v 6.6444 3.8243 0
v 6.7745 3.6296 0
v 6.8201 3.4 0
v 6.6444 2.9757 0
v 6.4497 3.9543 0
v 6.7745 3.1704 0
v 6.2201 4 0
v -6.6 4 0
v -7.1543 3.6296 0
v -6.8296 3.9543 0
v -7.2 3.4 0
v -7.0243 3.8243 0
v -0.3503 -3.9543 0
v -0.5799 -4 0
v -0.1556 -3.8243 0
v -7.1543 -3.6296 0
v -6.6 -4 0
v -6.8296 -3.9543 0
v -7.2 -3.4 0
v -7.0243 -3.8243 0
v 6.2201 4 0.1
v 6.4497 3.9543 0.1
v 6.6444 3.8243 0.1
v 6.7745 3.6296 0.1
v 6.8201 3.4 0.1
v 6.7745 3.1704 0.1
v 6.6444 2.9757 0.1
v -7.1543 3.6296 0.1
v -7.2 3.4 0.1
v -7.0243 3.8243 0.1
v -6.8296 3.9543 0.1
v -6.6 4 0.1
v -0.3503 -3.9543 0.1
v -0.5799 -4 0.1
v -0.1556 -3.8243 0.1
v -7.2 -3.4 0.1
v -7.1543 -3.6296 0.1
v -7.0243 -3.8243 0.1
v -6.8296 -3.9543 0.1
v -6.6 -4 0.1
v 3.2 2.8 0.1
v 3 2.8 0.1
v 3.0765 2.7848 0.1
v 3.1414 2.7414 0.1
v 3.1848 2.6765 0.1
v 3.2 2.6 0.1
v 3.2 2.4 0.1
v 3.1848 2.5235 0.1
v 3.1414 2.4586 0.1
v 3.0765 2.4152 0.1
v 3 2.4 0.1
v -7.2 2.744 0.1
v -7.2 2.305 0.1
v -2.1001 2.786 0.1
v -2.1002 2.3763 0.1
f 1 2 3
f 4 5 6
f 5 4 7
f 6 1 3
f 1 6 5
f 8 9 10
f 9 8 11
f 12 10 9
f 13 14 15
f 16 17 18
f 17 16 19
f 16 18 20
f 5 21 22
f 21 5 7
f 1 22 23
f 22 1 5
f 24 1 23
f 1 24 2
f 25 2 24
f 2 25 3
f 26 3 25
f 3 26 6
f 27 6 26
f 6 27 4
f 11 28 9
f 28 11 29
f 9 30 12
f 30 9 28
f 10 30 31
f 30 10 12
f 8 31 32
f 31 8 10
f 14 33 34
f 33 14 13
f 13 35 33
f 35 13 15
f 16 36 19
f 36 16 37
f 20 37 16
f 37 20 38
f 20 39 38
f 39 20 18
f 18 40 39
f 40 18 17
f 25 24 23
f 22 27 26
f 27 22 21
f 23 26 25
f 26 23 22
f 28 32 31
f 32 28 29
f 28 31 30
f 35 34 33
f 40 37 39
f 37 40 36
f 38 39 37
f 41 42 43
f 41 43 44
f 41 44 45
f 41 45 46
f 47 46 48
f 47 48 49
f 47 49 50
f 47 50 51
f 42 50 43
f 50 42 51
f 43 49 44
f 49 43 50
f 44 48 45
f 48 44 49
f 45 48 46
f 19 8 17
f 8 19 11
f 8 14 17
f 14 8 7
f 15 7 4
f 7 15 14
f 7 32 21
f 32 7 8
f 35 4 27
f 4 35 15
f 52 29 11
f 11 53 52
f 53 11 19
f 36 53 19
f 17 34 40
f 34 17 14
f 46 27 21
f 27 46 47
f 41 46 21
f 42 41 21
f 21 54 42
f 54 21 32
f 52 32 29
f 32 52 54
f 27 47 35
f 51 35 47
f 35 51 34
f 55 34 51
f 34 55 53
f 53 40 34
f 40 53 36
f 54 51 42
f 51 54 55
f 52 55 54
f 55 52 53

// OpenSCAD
// file: ../p/3-8cyli.scad
use <../lib.scad>
function ldraw_lib__3_8cyli() = [
// 0 Cylinder 0.375
// 0 Name: 3-8cyli.dat
// 0 Author: James Jessiman
// 0 !LDRAW_ORG Primitive UPDATE 2005-01
// 0 !LICENSE Licensed under CC BY 4.0 : see CAreadme.txt
// 
// 0 BFC CERTIFY CCW
  [0,"BFC","CERTIFY"],
  [0,"BFC","CCW"],
// 
// 0 !HISTORY 2002-05-08 [OrionP] Made BFC compliant
// 0 !HISTORY 2002-08-18 [PTadmin] Official Update 2002-04
// 0 !HISTORY 2004-12-11 [nielsk] Recreated using Primitive Generator, Edge lines fixed, BFC changed to CCW
// 0 !HISTORY 2005-12-28 [PTadmin] Official Update 2005-01
// 0 !HISTORY 2007-06-24 [PTadmin] Header formatted for Contributor Agreement
// 0 !HISTORY 2008-07-01 [PTadmin] Official Update 2008-01
// 
// 
// 4 16 .9239 1 .3827 .9239 0 .3827 1 0 0 1 1 0
  [4,16,.9239,1,.3827,.9239,0,.3827,1,0,0,1,1,0],
// 4 16 .7071 1 .7071 .7071 0 .7071 .9239 0 .3827 .9239 1 .3827
  [4,16,.7071,1,.7071,.7071,0,.7071,.9239,0,.3827,.9239,1,.3827],
// 4 16 .3827 1 .9239 .3827 0 .9239 .7071 0 .7071 .7071 1 .7071
  [4,16,.3827,1,.9239,.3827,0,.9239,.7071,0,.7071,.7071,1,.7071],
// 4 16 0 1 1 0 0 1 .3827 0 .9239 .3827 1 .9239
  [4,16,0,1,1,0,0,1,.3827,0,.9239,.3827,1,.9239],
// 4 16 -.3827 1 .9239 -.3827 0 .9239 0 0 1 0 1 1
  [4,16,-.3827,1,.9239,-.3827,0,.9239,0,0,1,0,1,1],
// 4 16 -.7071 1 .7071 -.7071 0 .7071 -.3827 0 .9239 -.3827 1 .9239
  [4,16,-.7071,1,.7071,-.7071,0,.7071,-.3827,0,.9239,-.3827,1,.9239],
// 5 24 1 1 0 1 0 0 1 1 -.4142 .9239 1 .3827
  [5,24,1,1,0,1,0,0,1,1,-.4142,.9239,1,.3827],
// 5 24 .9239 1 .3827 .9239 0 .3827 1 1 0 .7071 1 .7071
  [5,24,.9239,1,.3827,.9239,0,.3827,1,1,0,.7071,1,.7071],
// 5 24 .7071 1 .7071 .7071 0 .7071 .9239 1 .3827 .3827 1 .9239
  [5,24,.7071,1,.7071,.7071,0,.7071,.9239,1,.3827,.3827,1,.9239],
// 5 24 .3827 1 .9239 .3827 0 .9239 .7071 1 .7071 0 1 1
  [5,24,.3827,1,.9239,.3827,0,.9239,.7071,1,.7071,0,1,1],
// 5 24 0 1 1 0 0 1 .3827 1 .9239 -.3827 1 .9239
  [5,24,0,1,1,0,0,1,.3827,1,.9239,-.3827,1,.9239],
// 5 24 -.3827 1 .9239 -.3827 0 .9239 0 1 1 -.7071 1 .7071
  [5,24,-.3827,1,.9239,-.3827,0,.9239,0,1,1,-.7071,1,.7071],
// 5 24 -.7071 1 .7071 -.7071 0 .7071 -.3827 1 .9239 -1 1 .4142
  [5,24,-.7071,1,.7071,-.7071,0,.7071,-.3827,1,.9239,-1,1,.4142],
// 0
];
module ldraw_lib__3_8cyli(step=0, col=false, unit=2/5, alt=false, line=0.2, solid=!$preview)
    makepoly(ldraw_lib__3_8cyli(), step=step, col=col, unit=unit, alt=alt, line=line, solid=solid);
ldraw_lib__3_8cyli(line=0.2);
// file: ../p/3-8chrd.scad
use <../lib.scad>
function ldraw_lib__3_8chrd() = [
// 0 Chord 0.375
// 0 Name: 3-8chrd.dat
// 0 Author: Donald Sutter [technog]
// 0 !LDRAW_ORG Primitive UPDATE 2005-01
// 0 !LICENSE Licensed under CC BY 4.0 : see CAreadme.txt
// 
// 0 BFC CERTIFY CCW
  [0,"BFC","CERTIFY"],
  [0,"BFC","CCW"],
// 
// 0 !HISTORY 2004-01-07 [Steffen] added primitive code for POVray
// 0 !HISTORY 2004-03-18 [mkennedy] removed pov code and rearanged polygons.
// 0 !HISTORY 2004-09-12 [cwdee] reversed winding and standardised precision
// 0 !HISTORY 2005-12-28 [PTadmin] Official Update 2005-01
// 0 !HISTORY 2007-06-24 [PTadmin] Header formatted for Contributor Agreement
// 0 !HISTORY 2008-07-01 [PTadmin] Official Update 2008-01
// 
// 
// 3 16 0.7071 0 0.7071 0.3827 0 0.9239 0 0 1
  [3,16,0.7071,0,0.7071,0.3827,0,0.9239,0,0,1],
// 4 16 0.9239 0 0.3827 -0.3827 0 0.9239 -0.7071 0 0.7071 1 0 0
  [4,16,0.9239,0,0.3827,-0.3827,0,0.9239,-0.7071,0,0.7071,1,0,0],
// 4 16 0.7071 0 0.7071 0 0 1 -0.3827 0 0.9239 0.9239 0 0.3827
  [4,16,0.7071,0,0.7071,0,0,1,-0.3827,0,0.9239,0.9239,0,0.3827],
// 0
];
module ldraw_lib__3_8chrd(step=0, col=false, unit=2/5, alt=false, line=0.2, solid=!$preview)
    makepoly(ldraw_lib__3_8chrd(), step=step, col=col, unit=unit, alt=alt, line=line, solid=solid);
ldraw_lib__3_8chrd(line=0.2);
// file: ../p/2-4ndis.scad
use <../lib.scad>
function ldraw_lib__2_4ndis() = [
// 0 Disc Negative 0.5
// 0 Name: 2-4ndis.dat
// 0 Author: James Jessiman
// 0 !LDRAW_ORG Primitive UPDATE 2012-01
// 0 !LICENSE Licensed under CC BY 4.0 : see CAreadme.txt
// 
// 0 BFC CERTIFY CCW
  [0,"BFC","CERTIFY"],
  [0,"BFC","CCW"],
// 
// 0 !HISTORY 2002-03-23 [sbliss] Added BFC statement; compacted code
// 0 !HISTORY 2002-04-25 [PTadmin] Official Update 2002-02
// 0 !HISTORY 2007-06-24 [PTadmin] Header formatted for Contributor Agreement
// 0 !HISTORY 2008-07-01 [PTadmin] Official Update 2008-01
// 0 !HISTORY 2012-02-16 [Philo] Changed to CCW
// 0 !HISTORY 2012-03-30 [PTadmin] Official Update 2012-01
// 
// 
// 3 16 0.9239 0 0.3827 1 0 0 1 0 1
  [3,16,0.9239,0,0.3827,1,0,0,1,0,1],
// 3 16 0.7071 0 0.7071 0.9239 0 0.3827 1 0 1
  [3,16,0.7071,0,0.7071,0.9239,0,0.3827,1,0,1],
// 3 16 0.3827 0 0.9239 0.7071 0 0.7071 1 0 1
  [3,16,0.3827,0,0.9239,0.7071,0,0.7071,1,0,1],
// 3 16 0 0 1 0.3827 0 0.9239 1 0 1
  [3,16,0,0,1,0.3827,0,0.9239,1,0,1],
// 3 16 -0.3827 0 0.9239 0 0 1 -1 0 1
  [3,16,-0.3827,0,0.9239,0,0,1,-1,0,1],
// 3 16 -0.7071 0 0.7071 -0.3827 0 0.9239 -1 0 1
  [3,16,-0.7071,0,0.7071,-0.3827,0,0.9239,-1,0,1],
// 3 16 -0.9239 0 0.3827 -0.7071 0 0.7071 -1 0 1
  [3,16,-0.9239,0,0.3827,-0.7071,0,0.7071,-1,0,1],
// 3 16 -1 0 0 -0.9239 0 0.3827 -1 0 1
  [3,16,-1,0,0,-0.9239,0,0.3827,-1,0,1],
];
module ldraw_lib__2_4ndis(step=0, col=false, unit=2/5, alt=false, line=0.2, solid=!$preview)
    makepoly(ldraw_lib__2_4ndis(), step=step, col=col, unit=unit, alt=alt, line=line, solid=solid);
ldraw_lib__2_4ndis(line=0.2);
// file: ../p/2-4chrd.scad
use <../lib.scad>
function ldraw_lib__2_4chrd() = [
// 0 Chord 0.5
// 0 Name: 2-4chrd.dat
// 0 Author: Philippe Hurbain [Philo]
// 0 !LDRAW_ORG Primitive UPDATE 2014-01
// 0 !LICENSE Licensed under CC BY 4.0 : see CAreadme.txt
// 
// 0 BFC CERTIFY CCW
  [0,"BFC","CERTIFY"],
  [0,"BFC","CCW"],
// 
// 0 !HISTORY 2014-06-21 [PTadmin] Official Update 2014-01
// 
// 
// 4 16 0.9239 0 0.3827 -0.9239 0 0.3827 -1 0 0 1 0 0
  [4,16,0.9239,0,0.3827,-0.9239,0,0.3827,-1,0,0,1,0,0],
// 4 16 0.7071 0 0.7071 -0.7071 0 0.7071 -0.9239 0 0.3827 0.9239 0 0.3827
  [4,16,0.7071,0,0.7071,-0.7071,0,0.7071,-0.9239,0,0.3827,0.9239,0,0.3827],
// 4 16 0.3827 0 0.9239 -0.3827 0 0.9239 -0.7071 0 0.7071 0.7071 0 0.7071
  [4,16,0.3827,0,0.9239,-0.3827,0,0.9239,-0.7071,0,0.7071,0.7071,0,0.7071],
// 3 16 0 0 1 -0.3827 0 0.9239 0.3827 0 0.9239
  [3,16,0,0,1,-0.3827,0,0.9239,0.3827,0,0.9239],
];
module ldraw_lib__2_4chrd(step=0, col=false, unit=2/5, alt=false, line=0.2, solid=!$preview)
    makepoly(ldraw_lib__2_4chrd(), step=step, col=col, unit=unit, alt=alt, line=line, solid=solid);
ldraw_lib__2_4chrd(line=0.2);
// file: ../p/1-8cyli.scad
use <../lib.scad>
function ldraw_lib__1_8cyli() = [
// 0 Cylinder 0.125
// 0 Name: 1-8cyli.dat
// 0 Author: James Jessiman
// 0 !LDRAW_ORG Primitive UPDATE 2005-01
// 0 !LICENSE Licensed under CC BY 4.0 : see CAreadme.txt
// 
// 0 BFC CERTIFY CCW
  [0,"BFC","CERTIFY"],
  [0,"BFC","CCW"],
// 
// 0 !HISTORY 2002-04-25 [PTadmin] Official Update 2002-02
// 0 !HISTORY 2004-12-11 [nielsk] Recreated using Primitive Generator, Edge lines fixed, BFC changed to CCW
// 0 !HISTORY 2005-12-28 [PTadmin] Official Update 2005-01
// 0 !HISTORY 2007-06-22 [PTadmin] Header formatted for Contributor Agreement
// 0 !HISTORY 2008-07-01 [PTadmin] Official Update 2008-01
// 
// 
// 4 16 .9239 1 .3827 .9239 0 .3827 1 0 0 1 1 0
  [4,16,.9239,1,.3827,.9239,0,.3827,1,0,0,1,1,0],
// 4 16 .7071 1 .7071 .7071 0 .7071 .9239 0 .3827 .9239 1 .3827
  [4,16,.7071,1,.7071,.7071,0,.7071,.9239,0,.3827,.9239,1,.3827],
// 5 24 1 1 0 1 0 0 1 1 -.4142 .9239 1 .3827
  [5,24,1,1,0,1,0,0,1,1,-.4142,.9239,1,.3827],
// 5 24 .9239 1 .3827 .9239 0 .3827 1 1 0 .7071 1 .7071
  [5,24,.9239,1,.3827,.9239,0,.3827,1,1,0,.7071,1,.7071],
// 5 24 .7071 1 .7071 .7071 0 .7071 .9239 1 .3827 .4142 1 1
  [5,24,.7071,1,.7071,.7071,0,.7071,.9239,1,.3827,.4142,1,1],
// 0
];
module ldraw_lib__1_8cyli(step=0, col=false, unit=2/5, alt=false, line=0.2, solid=!$preview)
    makepoly(ldraw_lib__1_8cyli(), step=step, col=col, unit=unit, alt=alt, line=line, solid=solid);
ldraw_lib__1_8cyli(line=0.2);
// file: ../p/1-8chrd.scad
use <../lib.scad>
function ldraw_lib__1_8chrd() = [
// 0 Chord 0.125
// 0 Name: 1-8chrd.dat
// 0 Author: Orion Pobursky [OrionP]
// 0 !LDRAW_ORG Primitive UPDATE 2023-05
// 0 !LICENSE Licensed under CC BY 4.0 : see CAreadme.txt
// 
// 0 BFC CERTIFY CCW
  [0,"BFC","CERTIFY"],
  [0,"BFC","CCW"],
// 
// 0 !HISTORY 2004-04-22 [PTadmin] Official Update 2004-02
// 0 !HISTORY 2007-06-22 [PTadmin] Header formatted for Contributor Agreement
// 0 !HISTORY 2008-07-01 [PTadmin] Official Update 2008-01
// 0 !HISTORY 2023-10-27 [OrionP] Rebuilt with PrimGen2, original author westrate
// 0 !HISTORY 2023-10-31 [OrionP] Official Update 2023-05
// 
// 3 16 1 0 0 0.9239 0 0.3827 0.7071 0 0.7071
  [3,16,1,0,0,0.9239,0,0.3827,0.7071,0,0.7071],
];
module ldraw_lib__1_8chrd(step=0, col=false, unit=2/5, alt=false, line=0.2, solid=!$preview)
    makepoly(ldraw_lib__1_8chrd(), step=step, col=col, unit=unit, alt=alt, line=line, solid=solid);
ldraw_lib__1_8chrd(line=0.2);
// file: ../p/1-4cyli.scad
use <../lib.scad>
function ldraw_lib__1_4cyli() = [
// 0 Cylinder 0.25
// 0 Name: 1-4cyli.dat
// 0 Author: James Jessiman
// 0 !LDRAW_ORG Primitive UPDATE 2012-01
// 0 !LICENSE Licensed under CC BY 4.0 : see CAreadme.txt
// 
// 0 BFC CERTIFY CCW
  [0,"BFC","CERTIFY"],
  [0,"BFC","CCW"],
// 
// 0 !HISTORY 2002-03-23 [sbliss] Added BFC statement.
// 0 !HISTORY 2002-04-25 [PTadmin] Official Update 2002-02
// 0 !HISTORY 2007-06-22 [PTadmin] Header formatted for Contributor Agreement
// 0 !HISTORY 2008-07-01 [PTadmin] Official Update 2008-01
// 0 !HISTORY 2012-02-16 [Philo] Changed to CCW
// 0 !HISTORY 2012-03-30 [PTadmin] Official Update 2012-01
// 
// 
// 4 16 1 1 0 0.9239 1 0.3827 0.9239 0 0.3827 1 0 0
  [4,16,1,1,0,0.9239,1,0.3827,0.9239,0,0.3827,1,0,0],
// 5 24 1 0 0 1 1 0 0.9239 0 0.3827 1 0 -1
  [5,24,1,0,0,1,1,0,0.9239,0,0.3827,1,0,-1],
// 4 16 0.9239 1 0.3827 0.7071 1 0.7071 0.7071 0 0.7071 0.9239 0 0.3827
  [4,16,0.9239,1,0.3827,0.7071,1,0.7071,0.7071,0,0.7071,0.9239,0,0.3827],
// 5 24 0.9239 0 0.3827 0.9239 1 0.3827 0.7071 0 0.7071 1 0 0
  [5,24,0.9239,0,0.3827,0.9239,1,0.3827,0.7071,0,0.7071,1,0,0],
// 4 16 0.7071 1 0.7071 0.3827 1 0.9239 0.3827 0 0.9239 0.7071 0 0.7071
  [4,16,0.7071,1,0.7071,0.3827,1,0.9239,0.3827,0,0.9239,0.7071,0,0.7071],
// 5 24 0.7071 0 0.7071 0.7071 1 0.7071 0.3827 0 0.9239 0.9239 0 0.3827
  [5,24,0.7071,0,0.7071,0.7071,1,0.7071,0.3827,0,0.9239,0.9239,0,0.3827],
// 4 16 0.3827 1 0.9239 0 1 1 0 0 1 0.3827 0 0.9239
  [4,16,0.3827,1,0.9239,0,1,1,0,0,1,0.3827,0,0.9239],
// 5 24 0.3827 0 0.9239 0.3827 1 0.9239 0 0 1 0.7071 0 0.7071
  [5,24,0.3827,0,0.9239,0.3827,1,0.9239,0,0,1,0.7071,0,0.7071],
// 5 24 0 0 1 0 1 1 0.3827 0 0.9239 -1 0 1
  [5,24,0,0,1,0,1,1,0.3827,0,0.9239,-1,0,1],
];
module ldraw_lib__1_4cyli(step=0, col=false, unit=2/5, alt=false, line=0.2, solid=!$preview)
    makepoly(ldraw_lib__1_4cyli(), step=step, col=col, unit=unit, alt=alt, line=line, solid=solid);
ldraw_lib__1_4cyli(line=0.2);
// file: ../p/1-4chrd.scad
use <../lib.scad>
function ldraw_lib__1_4chrd() = [
// 0 Chord 0.25
// 0 Name: 1-4chrd.dat
// 0 Author: Max Martin Richter [MMR1988]
// 0 !LDRAW_ORG Primitive UPDATE 2023-05
// 0 !LICENSE Licensed under CC BY 4.0 : see CAreadme.txt
// 
// 0 BFC CERTIFY CCW
  [0,"BFC","CERTIFY"],
  [0,"BFC","CCW"],
// 
// 0 !HISTORY 2004-04-22 [PTadmin] Official Update 2004-02
// 0 !HISTORY 2007-10-09 [PTadmin] Header formatted for Contributor Agreement
// 0 !HISTORY 2008-07-01 [PTadmin] Official Update 2008-01
// 0 !HISTORY 2012-08-02 [MMR1988] Re-creation with PrimGen2 and Rectifier
// 0 !HISTORY 2012-08-09 [PTadmin] Official Update 2012-02
// 0 !HISTORY 2023-10-27 [OrionP] Change author to MMR1988 from hafhead
// 0 !HISTORY 2023-10-31 [OrionP] Official Update 2023-05
// 
// 4 16 0.9239 0 0.3827 0.3827 0 0.9239 0 0 1 1 0 0
  [4,16,0.9239,0,0.3827,0.3827,0,0.9239,0,0,1,1,0,0],
// 3 16 0.7071 0 0.7071 0.3827 0 0.9239 0.9239 0 0.3827
  [3,16,0.7071,0,0.7071,0.3827,0,0.9239,0.9239,0,0.3827],
];
module ldraw_lib__1_4chrd(step=0, col=false, unit=2/5, alt=false, line=0.2, solid=!$preview)
    makepoly(ldraw_lib__1_4chrd(), step=step, col=col, unit=unit, alt=alt, line=line, solid=solid);
ldraw_lib__1_4chrd(line=0.2);
// file: 6148328aj.scad
use <../lib.scad>
use <../p/1-4chrd.scad>
use <../p/1-4cyli.scad>
use <../p/1-8chrd.scad>
use <../p/1-8cyli.scad>
use <../p/2-4chrd.scad>
use <../p/2-4ndis.scad>
use <../p/3-8chrd.scad>
use <../p/3-8cyli.scad>
function ldraw_lib__6148328aj() = [
// 0 Sticker  1.0 x  1.8 with White Stripe on Red Background Right
// 0 Name: 6148328aj.dat
// 0 Author: Massimo Maso [Sirio]
// 0 !LDRAW_ORG Part UPDATE 2024-08
// 0 !LICENSE Licensed under CC BY 4.0 : see CAreadme.txt
// 
// 0 BFC CERTIFY CCW
  [0,"BFC","CERTIFY"],
  [0,"BFC","CCW"],
// 
// 0 !KEYWORDS 917K, Bricklink 75876stk01, Brickowl 852010, Pit Lane, Porsche
// 0 !KEYWORDS Rebrickable 26357, set 75876, Speed Champions
// 
// 0 !HISTORY 2024-09-30 [OrionP] Official Update 2024-08
// 
// 
// 0 // Primitives
// 
// 1 16 -15.5503 0 8.5 0 0 -1.5 0 -1 0 1.5 0 0 3-8chrd.dat
  [1,16,-15.5503,0,8.5,0,0,-1.5,0,-1,0,1.5,0,0, ldraw_lib__3_8chrd()],
// 1 16 16.5 0 8.5 1.5 0 0 0 -1 0 0 0 1.5 1-4chrd.dat
  [1,16,16.5,0,8.5,1.5,0,0,0,-1,0,0,0,1.5, ldraw_lib__1_4chrd()],
// 1 16 1.4497 0 -8.5 0 0 -1.5 0 -1 0 -1.5 0 0 1-8chrd.dat
  [1,16,1.4497,0,-8.5,0,0,-1.5,0,-1,0,-1.5,0,0, ldraw_lib__1_8chrd()],
// 1 16 16.5 0 -8.5 1.5 0 0 0 -1 0 0 0 -1.5 1-4chrd.dat
  [1,16,16.5,0,-8.5,1.5,0,0,0,-1,0,0,0,-1.5, ldraw_lib__1_4chrd()],
// 1 16 -15.5503 0 8.5 0 0 -1.5 0 -.25 0 1.5 0 0 3-8cyli.dat
  [1,16,-15.5503,0,8.5,0,0,-1.5,0,-.25,0,1.5,0,0, ldraw_lib__3_8cyli()],
// 1 16 16.5 0 8.5 1.5 0 0 0 -.25 0 0 0 1.5 1-4cyli.dat
  [1,16,16.5,0,8.5,1.5,0,0,0,-.25,0,0,0,1.5, ldraw_lib__1_4cyli()],
// 1 16 1.4497 0 -8.5 0 0 -1.5 0 -.25 0 -1.5 0 0 1-8cyli.dat
  [1,16,1.4497,0,-8.5,0,0,-1.5,0,-.25,0,-1.5,0,0, ldraw_lib__1_8cyli()],
// 1 16 16.5 0 -8.5 1.5 0 0 0 -.25 0 0 0 -1.5 1-4cyli.dat
  [1,16,16.5,0,-8.5,1.5,0,0,0,-.25,0,0,0,-1.5, ldraw_lib__1_4cyli()],
// 1 4 -15.5503 -.25 8.5 0 0 -1.5 0 1 0 1.5 0 0 3-8chrd.dat
  [1,4,-15.5503,-.25,8.5,0,0,-1.5,0,1,0,1.5,0,0, ldraw_lib__3_8chrd()],
// 1 4 16.5 -.25 8.5 1.5 0 0 0 1 0 0 0 1.5 1-4chrd.dat
  [1,4,16.5,-.25,8.5,1.5,0,0,0,1,0,0,0,1.5, ldraw_lib__1_4chrd()],
// 1 4 1.4497 -.25 -8.5 0 0 -1.5 0 1 0 -1.5 0 0 1-8chrd.dat
  [1,4,1.4497,-.25,-8.5,0,0,-1.5,0,1,0,-1.5,0,0, ldraw_lib__1_8chrd()],
// 1 4 16.5 -.25 -8.5 1.5 0 0 0 1 0 0 0 -1.5 1-4chrd.dat
  [1,4,16.5,-.25,-8.5,1.5,0,0,0,1,0,0,0,-1.5, ldraw_lib__1_4chrd()],
// 1 4 -7.5 -.25 6.5 0 0 -.5 0 1 0 .5 0 0 2-4ndis.dat
  [1,4,-7.5,-.25,6.5,0,0,-.5,0,1,0,.5,0,0, ldraw_lib__2_4ndis()],
// 1 15 -7.5 -.25 6.5 0 0 -.5 0 1 0 .5 0 0 2-4chrd.dat
  [1,15,-7.5,-.25,6.5,0,0,-.5,0,1,0,.5,0,0, ldraw_lib__2_4chrd()],
// 0 // Bottom faces
// 4 16 16.5 0 10 18 0 8.5 18 0 -8.5 16.5 0 -10
  [4,16,16.5,0,10,18,0,8.5,18,0,-8.5,16.5,0,-10],
// 4 16 16.5 0 10 16.5 0 -10 1.4497 0 -10 -15.5503 0 10
  [4,16,16.5,0,10,16.5,0,-10,1.4497,0,-10,-15.5503,0,10],
// 4 16 -15.5503 0 10 1.4497 0 -10 .38905 0 -9.56065 -16.61095 0 7.43935
  [4,16,-15.5503,0,10,1.4497,0,-10,.38905,0,-9.56065,-16.61095,0,7.43935],
// 0 // Lateral faces
// 4 16 16.5 0 10 -15.5503 0 10 -15.5503 -.25 10 16.5 -.25 10
  [4,16,16.5,0,10,-15.5503,0,10,-15.5503,-.25,10,16.5,-.25,10],
// 4 16 .38905 0 -9.56065 .38905 -.25 -9.56065 -16.61095 -.25 7.43935 -16.61095 0 7.43935
  [4,16,.38905,0,-9.56065,.38905,-.25,-9.56065,-16.61095,-.25,7.43935,-16.61095,0,7.43935],
// 3 16 18 0 8.5 18 -.25 8.5 18 -.25 6.86
  [3,16,18,0,8.5,18,-.25,8.5,18,-.25,6.86],
// 4 16 18 0 8.5 18 -.25 6.86 18 -.25 5.7626 18 0 -8.5
  [4,16,18,0,8.5,18,-.25,6.86,18,-.25,5.7626,18,0,-8.5],
// 3 16 18 0 -8.5 18 -.25 5.7626 18 -.25 -8.5
  [3,16,18,0,-8.5,18,-.25,5.7626,18,-.25,-8.5],
// 4 16 1.4497 0 -10 16.5 0 -10 16.5 -.25 -10 1.4497 -.25 -10
  [4,16,1.4497,0,-10,16.5,0,-10,16.5,-.25,-10,1.4497,-.25,-10],
// 0 // Top faces
// 0 // Red faces
// 4 4 -15.5503 -.25 10 -16.61095 -.25 7.43935 -8 -.25 6 -8 -.25 6.5
  [4,4,-15.5503,-.25,10,-16.61095,-.25,7.43935,-8,-.25,6,-8,-.25,6.5],
// 3 4 -15.5503 -.25 10 -8 -.25 6.5 -8 -.25 7
  [3,4,-15.5503,-.25,10,-8,-.25,6.5,-8,-.25,7],
// 3 4 -15.5503 -.25 10 -8 -.25 7 -7.5 -.25 7
  [3,4,-15.5503,-.25,10,-8,-.25,7,-7.5,-.25,7],
// 4 4 -15.5503 -.25 10 -7.5 -.25 7 5.2502 -.25 6.965 16.5 -.25 10
  [4,4,-15.5503,-.25,10,-7.5,-.25,7,5.2502,-.25,6.965,16.5,-.25,10],
// 4 4 16.5 -.25 10 5.2502 -.25 6.965 18 -.25 6.86 18 -.25 8.5
  [4,4,16.5,-.25,10,5.2502,-.25,6.965,18,-.25,6.86,18,-.25,8.5],
// 3 4 .38905 -.25 -9.56065 -8 -.25 6 -16.61095 -.25 7.43935
  [3,4,.38905,-.25,-9.56065,-8,-.25,6,-16.61095,-.25,7.43935],
// 4 4 .38905 -.25 -9.56065 1.4497 -.25 -10 -7.5 -.25 6 -8 -.25 6
  [4,4,.38905,-.25,-9.56065,1.4497,-.25,-10,-7.5,-.25,6,-8,-.25,6],
// 4 4 1.4497 -.25 -10 18 -.25 5.7626 5.2506 -.25 5.9407 -7.5 -.25 6
  [4,4,1.4497,-.25,-10,18,-.25,5.7626,5.2506,-.25,5.9407,-7.5,-.25,6],
// 4 4 1.4497 -.25 -10 16.5 -.25 -10 18 -.25 -8.5 18 -.25 5.7626
  [4,4,1.4497,-.25,-10,16.5,-.25,-10,18,-.25,-8.5,18,-.25,5.7626],
// 0 // White faces
// 4 15 5.2502 -.25 6.965 -7.5 -.25 7 -7.5 -.25 6 5.2506 -.25 5.9407
  [4,15,5.2502,-.25,6.965,-7.5,-.25,7,-7.5,-.25,6,5.2506,-.25,5.9407],
// 4 15 5.2502 -.25 6.965 5.2506 -.25 5.9407 18 -.25 5.7626 18 -.25 6.86
  [4,15,5.2502,-.25,6.965,5.2506,-.25,5.9407,18,-.25,5.7626,18,-.25,6.86],
];
module ldraw_lib__6148328aj(step=0, col=false, unit=2/5, alt=false, line=0.2, solid=!$preview)
    makepoly(ldraw_lib__6148328aj(), step=step, col=col, unit=unit, alt=alt, line=line, solid=solid);
ldraw_lib__6148328aj(line=0.2);
// main file
use <../lib.scad>
use <6148328aj.scad>
function ldraw_lib__6148328al() = [
// 0 Sticker  1.0 x  1.8 with White Stripe on Red Background Left
// 0 Name: 6148328al.dat
// 0 Author: Massimo Maso [Sirio]
// 0 !LDRAW_ORG Part UPDATE 2024-08
// 0 !LICENSE Licensed under CC BY 4.0 : see CAreadme.txt
// 
// 0 BFC CERTIFY CCW
  [0,"BFC","CERTIFY"],
  [0,"BFC","CCW"],
// 
// 0 !KEYWORDS 917K, Bricklink 75876stk01, Brickowl 852010, Pit Lane, Porsche
// 0 !KEYWORDS Rebrickable 26357, set 75876, Speed Champions
// 
// 0 !HISTORY 2024-09-30 [OrionP] Official Update 2024-08
// 
// 
// 1 16 0 0 0 -1 0 0 0 1 0 0 0 1 6148328aj.dat
  [1,16,0,0,0,-1,0,0,0,1,0,0,0,1, ldraw_lib__6148328aj()],
];
module ldraw_lib__6148328al(step=0, col=false, unit=2/5, alt=false, line=0.2, solid=!$preview)
    makepoly(ldraw_lib__6148328al(), step=step, col=col, unit=unit, alt=alt, line=line, solid=solid);
ldraw_lib__6148328al(line=0.2);
